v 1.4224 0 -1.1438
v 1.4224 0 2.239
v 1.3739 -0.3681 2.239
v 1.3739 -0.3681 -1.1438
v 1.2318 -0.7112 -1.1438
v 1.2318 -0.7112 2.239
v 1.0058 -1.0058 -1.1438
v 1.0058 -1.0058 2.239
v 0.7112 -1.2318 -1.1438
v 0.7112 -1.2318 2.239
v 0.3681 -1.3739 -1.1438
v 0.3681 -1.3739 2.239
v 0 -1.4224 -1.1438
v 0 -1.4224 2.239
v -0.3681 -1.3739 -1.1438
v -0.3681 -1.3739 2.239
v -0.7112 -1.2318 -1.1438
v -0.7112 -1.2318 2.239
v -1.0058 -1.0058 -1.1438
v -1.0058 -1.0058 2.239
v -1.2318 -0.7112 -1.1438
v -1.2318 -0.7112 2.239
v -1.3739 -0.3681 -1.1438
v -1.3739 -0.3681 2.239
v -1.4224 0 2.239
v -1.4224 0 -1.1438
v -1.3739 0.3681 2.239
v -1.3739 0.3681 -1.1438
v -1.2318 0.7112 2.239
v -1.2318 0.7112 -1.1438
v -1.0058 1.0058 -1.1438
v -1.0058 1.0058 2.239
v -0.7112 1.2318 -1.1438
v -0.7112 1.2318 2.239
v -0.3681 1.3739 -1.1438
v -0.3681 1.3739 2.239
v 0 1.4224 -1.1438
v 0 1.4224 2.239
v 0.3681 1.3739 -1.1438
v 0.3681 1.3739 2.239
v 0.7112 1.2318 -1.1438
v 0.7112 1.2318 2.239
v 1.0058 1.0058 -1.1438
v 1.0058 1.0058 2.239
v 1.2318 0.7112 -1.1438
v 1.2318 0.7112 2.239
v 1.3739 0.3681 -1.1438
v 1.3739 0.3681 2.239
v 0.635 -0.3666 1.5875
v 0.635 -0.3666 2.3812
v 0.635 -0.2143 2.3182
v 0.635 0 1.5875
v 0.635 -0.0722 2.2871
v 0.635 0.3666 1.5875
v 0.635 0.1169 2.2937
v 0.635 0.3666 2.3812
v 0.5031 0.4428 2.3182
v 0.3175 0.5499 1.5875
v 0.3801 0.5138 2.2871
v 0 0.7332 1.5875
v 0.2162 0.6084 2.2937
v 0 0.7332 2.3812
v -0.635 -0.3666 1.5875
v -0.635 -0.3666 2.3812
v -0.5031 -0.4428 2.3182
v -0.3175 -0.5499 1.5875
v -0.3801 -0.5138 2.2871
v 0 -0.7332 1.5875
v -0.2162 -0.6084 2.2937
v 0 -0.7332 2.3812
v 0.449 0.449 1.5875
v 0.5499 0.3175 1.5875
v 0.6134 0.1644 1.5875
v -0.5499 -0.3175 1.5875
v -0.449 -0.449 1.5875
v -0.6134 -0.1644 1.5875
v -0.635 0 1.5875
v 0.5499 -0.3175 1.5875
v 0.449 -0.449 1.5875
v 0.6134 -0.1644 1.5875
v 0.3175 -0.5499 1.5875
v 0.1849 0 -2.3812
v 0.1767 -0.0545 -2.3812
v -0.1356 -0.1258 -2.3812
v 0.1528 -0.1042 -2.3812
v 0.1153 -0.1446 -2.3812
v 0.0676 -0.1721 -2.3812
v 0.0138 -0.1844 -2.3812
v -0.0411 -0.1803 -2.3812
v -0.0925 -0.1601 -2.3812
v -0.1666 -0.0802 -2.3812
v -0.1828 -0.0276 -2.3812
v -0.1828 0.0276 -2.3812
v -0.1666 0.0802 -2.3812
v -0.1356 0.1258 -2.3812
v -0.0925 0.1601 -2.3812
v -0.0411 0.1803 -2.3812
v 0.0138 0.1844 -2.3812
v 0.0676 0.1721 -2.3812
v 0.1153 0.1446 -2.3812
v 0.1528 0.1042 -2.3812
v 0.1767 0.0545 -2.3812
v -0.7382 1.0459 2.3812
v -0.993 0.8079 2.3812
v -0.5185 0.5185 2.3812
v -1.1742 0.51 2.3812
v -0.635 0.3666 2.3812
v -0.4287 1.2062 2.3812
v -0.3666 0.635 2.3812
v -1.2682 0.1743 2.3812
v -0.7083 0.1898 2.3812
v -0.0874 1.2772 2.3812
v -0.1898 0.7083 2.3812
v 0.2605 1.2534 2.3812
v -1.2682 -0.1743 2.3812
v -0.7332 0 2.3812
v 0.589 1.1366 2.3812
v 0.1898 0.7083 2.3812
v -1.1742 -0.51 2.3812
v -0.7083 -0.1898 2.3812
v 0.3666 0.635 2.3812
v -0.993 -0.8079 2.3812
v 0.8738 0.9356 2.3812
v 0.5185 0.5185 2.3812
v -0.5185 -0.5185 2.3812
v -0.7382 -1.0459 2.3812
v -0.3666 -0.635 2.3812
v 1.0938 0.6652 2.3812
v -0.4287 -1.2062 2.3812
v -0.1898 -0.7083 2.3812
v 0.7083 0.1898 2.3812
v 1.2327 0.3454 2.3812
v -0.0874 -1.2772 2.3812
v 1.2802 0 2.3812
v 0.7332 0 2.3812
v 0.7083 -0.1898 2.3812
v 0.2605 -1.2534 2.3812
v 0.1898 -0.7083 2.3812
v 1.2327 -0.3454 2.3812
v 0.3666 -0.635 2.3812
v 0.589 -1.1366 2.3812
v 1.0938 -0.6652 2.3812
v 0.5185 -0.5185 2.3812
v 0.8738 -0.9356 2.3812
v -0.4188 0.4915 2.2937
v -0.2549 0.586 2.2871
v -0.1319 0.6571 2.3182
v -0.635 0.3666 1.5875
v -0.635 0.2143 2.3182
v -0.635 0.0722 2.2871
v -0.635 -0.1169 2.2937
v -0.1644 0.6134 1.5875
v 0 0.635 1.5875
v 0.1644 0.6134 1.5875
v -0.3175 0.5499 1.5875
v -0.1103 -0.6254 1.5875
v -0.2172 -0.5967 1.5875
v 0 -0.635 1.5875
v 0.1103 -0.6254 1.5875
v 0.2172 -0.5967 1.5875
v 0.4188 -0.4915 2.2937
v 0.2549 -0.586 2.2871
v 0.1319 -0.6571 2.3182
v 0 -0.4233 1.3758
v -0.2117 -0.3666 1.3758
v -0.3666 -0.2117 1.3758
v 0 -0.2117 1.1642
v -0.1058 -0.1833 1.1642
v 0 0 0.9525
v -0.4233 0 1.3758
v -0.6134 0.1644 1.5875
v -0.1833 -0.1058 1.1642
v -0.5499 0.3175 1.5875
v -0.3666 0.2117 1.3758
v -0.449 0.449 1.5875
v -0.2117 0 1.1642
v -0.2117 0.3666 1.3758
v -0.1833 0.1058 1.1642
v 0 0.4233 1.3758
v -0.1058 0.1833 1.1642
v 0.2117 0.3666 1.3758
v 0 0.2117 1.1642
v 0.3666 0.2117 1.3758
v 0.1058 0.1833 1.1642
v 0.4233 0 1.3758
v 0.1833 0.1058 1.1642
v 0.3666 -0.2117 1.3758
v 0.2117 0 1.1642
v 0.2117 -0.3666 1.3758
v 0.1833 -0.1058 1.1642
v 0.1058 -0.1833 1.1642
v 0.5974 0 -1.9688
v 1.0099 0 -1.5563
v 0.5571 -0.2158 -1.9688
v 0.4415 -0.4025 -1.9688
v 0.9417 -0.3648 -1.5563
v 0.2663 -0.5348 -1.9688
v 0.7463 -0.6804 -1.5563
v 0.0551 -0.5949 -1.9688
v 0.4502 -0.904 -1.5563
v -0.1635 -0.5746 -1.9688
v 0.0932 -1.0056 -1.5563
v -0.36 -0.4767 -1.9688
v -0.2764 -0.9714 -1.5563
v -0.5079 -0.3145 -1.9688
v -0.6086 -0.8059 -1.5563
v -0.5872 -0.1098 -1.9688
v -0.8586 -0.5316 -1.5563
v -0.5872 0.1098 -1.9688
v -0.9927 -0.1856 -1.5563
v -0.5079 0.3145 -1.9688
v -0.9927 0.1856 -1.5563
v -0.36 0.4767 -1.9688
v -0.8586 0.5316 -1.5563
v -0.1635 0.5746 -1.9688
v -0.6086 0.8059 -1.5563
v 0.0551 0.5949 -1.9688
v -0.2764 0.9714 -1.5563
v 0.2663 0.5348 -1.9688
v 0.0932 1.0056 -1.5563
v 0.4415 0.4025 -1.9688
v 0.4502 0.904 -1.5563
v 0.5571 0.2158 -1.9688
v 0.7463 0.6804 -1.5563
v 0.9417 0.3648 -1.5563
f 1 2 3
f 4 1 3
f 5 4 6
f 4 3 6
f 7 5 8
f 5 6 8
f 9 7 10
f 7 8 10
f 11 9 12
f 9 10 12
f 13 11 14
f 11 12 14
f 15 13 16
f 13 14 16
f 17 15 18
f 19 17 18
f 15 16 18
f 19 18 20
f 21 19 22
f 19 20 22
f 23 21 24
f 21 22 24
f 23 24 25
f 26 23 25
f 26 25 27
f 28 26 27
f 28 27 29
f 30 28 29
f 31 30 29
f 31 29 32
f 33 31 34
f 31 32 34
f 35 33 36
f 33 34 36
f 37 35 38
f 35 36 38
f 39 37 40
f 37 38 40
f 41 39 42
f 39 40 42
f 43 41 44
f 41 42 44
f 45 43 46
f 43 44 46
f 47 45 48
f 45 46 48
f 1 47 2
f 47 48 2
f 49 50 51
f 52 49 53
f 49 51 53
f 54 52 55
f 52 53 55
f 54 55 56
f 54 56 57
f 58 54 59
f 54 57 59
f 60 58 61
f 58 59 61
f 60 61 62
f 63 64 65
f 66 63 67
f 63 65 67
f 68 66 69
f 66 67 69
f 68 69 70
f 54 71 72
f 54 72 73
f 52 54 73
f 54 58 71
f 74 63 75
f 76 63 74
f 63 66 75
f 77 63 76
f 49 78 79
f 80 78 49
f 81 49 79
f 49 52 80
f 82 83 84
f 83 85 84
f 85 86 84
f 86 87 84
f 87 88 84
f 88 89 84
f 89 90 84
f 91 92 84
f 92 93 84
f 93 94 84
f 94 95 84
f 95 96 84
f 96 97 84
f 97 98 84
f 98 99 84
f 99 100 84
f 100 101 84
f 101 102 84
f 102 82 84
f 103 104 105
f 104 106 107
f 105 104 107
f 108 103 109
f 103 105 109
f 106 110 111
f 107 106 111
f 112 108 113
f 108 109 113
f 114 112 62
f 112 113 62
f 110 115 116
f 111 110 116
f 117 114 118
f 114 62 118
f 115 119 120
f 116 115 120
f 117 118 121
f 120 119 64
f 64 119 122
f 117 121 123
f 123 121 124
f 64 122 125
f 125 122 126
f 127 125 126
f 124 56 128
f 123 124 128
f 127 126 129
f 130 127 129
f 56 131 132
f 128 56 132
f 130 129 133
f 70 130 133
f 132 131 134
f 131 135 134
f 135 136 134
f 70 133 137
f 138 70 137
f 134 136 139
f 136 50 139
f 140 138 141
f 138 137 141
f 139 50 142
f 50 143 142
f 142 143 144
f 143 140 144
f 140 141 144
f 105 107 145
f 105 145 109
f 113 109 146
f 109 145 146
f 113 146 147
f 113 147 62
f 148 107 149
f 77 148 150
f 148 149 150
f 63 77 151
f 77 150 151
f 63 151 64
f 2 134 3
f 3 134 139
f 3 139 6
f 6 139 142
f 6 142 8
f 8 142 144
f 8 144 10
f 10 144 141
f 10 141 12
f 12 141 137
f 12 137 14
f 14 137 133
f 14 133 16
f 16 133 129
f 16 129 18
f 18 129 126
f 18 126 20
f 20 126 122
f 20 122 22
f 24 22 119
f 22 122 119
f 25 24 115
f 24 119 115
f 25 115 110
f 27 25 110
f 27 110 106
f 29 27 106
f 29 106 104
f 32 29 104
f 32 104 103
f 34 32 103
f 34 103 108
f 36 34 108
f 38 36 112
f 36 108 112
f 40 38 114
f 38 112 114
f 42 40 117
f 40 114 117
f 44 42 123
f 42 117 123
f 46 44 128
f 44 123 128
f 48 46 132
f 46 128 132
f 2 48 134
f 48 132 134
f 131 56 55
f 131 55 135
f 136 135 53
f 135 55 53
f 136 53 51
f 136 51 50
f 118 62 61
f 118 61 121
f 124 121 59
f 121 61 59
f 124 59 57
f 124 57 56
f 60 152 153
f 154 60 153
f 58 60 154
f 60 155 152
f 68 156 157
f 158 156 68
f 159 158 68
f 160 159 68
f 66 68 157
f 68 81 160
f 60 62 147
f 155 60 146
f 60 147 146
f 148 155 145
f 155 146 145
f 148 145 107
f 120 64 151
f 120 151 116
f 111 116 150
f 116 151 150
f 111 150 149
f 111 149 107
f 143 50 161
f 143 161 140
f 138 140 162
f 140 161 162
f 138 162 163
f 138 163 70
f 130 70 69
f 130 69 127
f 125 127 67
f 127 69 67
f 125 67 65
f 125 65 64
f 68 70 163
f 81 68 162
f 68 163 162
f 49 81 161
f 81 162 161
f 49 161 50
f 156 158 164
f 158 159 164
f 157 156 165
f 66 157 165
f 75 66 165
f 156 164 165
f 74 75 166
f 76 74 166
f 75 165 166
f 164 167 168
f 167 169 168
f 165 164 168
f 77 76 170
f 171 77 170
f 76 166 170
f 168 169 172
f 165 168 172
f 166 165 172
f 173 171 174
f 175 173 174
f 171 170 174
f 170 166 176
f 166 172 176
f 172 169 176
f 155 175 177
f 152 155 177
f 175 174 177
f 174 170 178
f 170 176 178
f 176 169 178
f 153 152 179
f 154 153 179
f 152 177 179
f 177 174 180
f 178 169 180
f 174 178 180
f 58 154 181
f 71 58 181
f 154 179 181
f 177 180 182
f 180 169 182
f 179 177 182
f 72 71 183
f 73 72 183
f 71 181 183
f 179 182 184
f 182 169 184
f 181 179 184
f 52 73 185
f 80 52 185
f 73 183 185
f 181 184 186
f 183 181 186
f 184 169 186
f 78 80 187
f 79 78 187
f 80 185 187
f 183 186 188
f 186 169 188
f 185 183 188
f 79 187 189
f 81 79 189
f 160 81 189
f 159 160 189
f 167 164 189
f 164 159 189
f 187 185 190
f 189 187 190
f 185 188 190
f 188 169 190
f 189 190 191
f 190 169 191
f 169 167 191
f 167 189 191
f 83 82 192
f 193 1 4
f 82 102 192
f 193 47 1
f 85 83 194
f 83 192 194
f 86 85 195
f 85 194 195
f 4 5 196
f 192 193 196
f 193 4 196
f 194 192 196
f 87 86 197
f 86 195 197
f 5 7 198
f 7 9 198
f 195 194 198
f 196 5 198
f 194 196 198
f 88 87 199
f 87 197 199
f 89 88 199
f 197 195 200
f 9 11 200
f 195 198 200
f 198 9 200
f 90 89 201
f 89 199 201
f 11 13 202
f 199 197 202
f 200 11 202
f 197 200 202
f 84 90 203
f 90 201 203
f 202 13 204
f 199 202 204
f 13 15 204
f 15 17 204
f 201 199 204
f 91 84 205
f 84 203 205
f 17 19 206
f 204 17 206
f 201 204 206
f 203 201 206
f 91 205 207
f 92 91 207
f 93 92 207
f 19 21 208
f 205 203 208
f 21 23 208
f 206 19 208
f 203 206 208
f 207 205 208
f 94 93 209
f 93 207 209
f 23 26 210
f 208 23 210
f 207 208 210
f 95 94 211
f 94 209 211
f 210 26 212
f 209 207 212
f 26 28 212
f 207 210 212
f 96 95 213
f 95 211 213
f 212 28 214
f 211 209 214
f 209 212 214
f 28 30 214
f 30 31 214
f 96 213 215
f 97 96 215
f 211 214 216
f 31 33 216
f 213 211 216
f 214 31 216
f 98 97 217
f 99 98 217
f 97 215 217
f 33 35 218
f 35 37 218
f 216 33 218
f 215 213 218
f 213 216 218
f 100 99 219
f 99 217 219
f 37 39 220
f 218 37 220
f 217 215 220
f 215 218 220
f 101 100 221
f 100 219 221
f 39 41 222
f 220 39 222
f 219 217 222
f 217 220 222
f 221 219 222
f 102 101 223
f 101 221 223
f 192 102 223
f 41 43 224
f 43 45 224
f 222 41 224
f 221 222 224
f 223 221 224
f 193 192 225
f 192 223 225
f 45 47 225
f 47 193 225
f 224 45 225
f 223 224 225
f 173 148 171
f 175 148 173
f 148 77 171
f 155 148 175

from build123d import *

# Parameters (mm, degrees)
CHAMFER1_SIZE      = 0.14224
CUT_EXTRUDE1_DEPTH = 0.79375


with BuildPart() as part:
    # Sketch2 → Revolve1 (revolve)
    with BuildSketch(Plane(origin=(0, 0, 0), x_dir=(0, 0, -1), z_dir=(1, 0, 0))):
        Polygon((-2.38125, 0), (2.38125, 0), (2.38125, 0.184912), (1.143762, 1.4224), (-2.38125, 1.4224), align=None)
    revolve(axis=Axis((0, 0, 2.38125), (0, 0, -1)))

    # Chamfer1
    chamfer1_edges = [part.edges().sort_by_distance(p)[0] for p in [
        (0, -1.4224, 2.38125),
    ]]
    chamfer(chamfer1_edges, length=CHAMFER1_SIZE)

    # Sketch3 → Cut-Extrude1 (cut)
    with BuildSketch(Plane.XY.offset(2.38125)):
        Polygon((0, -0.733234842), (0.635, -0.366617421), (0.635, 0.366617421), (0, 0.733234842), (-0.635, 0.366617421), (-0.635, -0.366617421), align=None)
    extrude(amount=-CUT_EXTRUDE1_DEPTH, mode=Mode.SUBTRACT)

    # Cut-Extrude2 cone 1 section (through the dimple's axis) → Cut-Extrude2 (revolve, cut)
    with BuildSketch(Plane(origin=(0, 0, 2.38125), x_dir=(0, -1, 0), z_dir=(1, 0, 0))):
        Polygon((0, 0), (0.733234842, 0), (0, 0.733234842), align=None)
    revolve(axis=Axis((0, 0, 2.38125), (0, 0, -1)), mode=Mode.SUBTRACT)

    # Cut-Extrude3 cone 1 section (through the dimple's axis) → Cut-Extrude3 (revolve, cut)
    with BuildSketch(Plane(origin=(0, 0, 1.5875), x_dir=(0, -1, 0), z_dir=(1, 0, 0))):
        Polygon((0, 0), (0.635, 0), (0, 0.635), align=None)
    revolve(axis=Axis((0, 0, 1.5875), (0, 0, -1)), mode=Mode.SUBTRACT)


solid = part.part
